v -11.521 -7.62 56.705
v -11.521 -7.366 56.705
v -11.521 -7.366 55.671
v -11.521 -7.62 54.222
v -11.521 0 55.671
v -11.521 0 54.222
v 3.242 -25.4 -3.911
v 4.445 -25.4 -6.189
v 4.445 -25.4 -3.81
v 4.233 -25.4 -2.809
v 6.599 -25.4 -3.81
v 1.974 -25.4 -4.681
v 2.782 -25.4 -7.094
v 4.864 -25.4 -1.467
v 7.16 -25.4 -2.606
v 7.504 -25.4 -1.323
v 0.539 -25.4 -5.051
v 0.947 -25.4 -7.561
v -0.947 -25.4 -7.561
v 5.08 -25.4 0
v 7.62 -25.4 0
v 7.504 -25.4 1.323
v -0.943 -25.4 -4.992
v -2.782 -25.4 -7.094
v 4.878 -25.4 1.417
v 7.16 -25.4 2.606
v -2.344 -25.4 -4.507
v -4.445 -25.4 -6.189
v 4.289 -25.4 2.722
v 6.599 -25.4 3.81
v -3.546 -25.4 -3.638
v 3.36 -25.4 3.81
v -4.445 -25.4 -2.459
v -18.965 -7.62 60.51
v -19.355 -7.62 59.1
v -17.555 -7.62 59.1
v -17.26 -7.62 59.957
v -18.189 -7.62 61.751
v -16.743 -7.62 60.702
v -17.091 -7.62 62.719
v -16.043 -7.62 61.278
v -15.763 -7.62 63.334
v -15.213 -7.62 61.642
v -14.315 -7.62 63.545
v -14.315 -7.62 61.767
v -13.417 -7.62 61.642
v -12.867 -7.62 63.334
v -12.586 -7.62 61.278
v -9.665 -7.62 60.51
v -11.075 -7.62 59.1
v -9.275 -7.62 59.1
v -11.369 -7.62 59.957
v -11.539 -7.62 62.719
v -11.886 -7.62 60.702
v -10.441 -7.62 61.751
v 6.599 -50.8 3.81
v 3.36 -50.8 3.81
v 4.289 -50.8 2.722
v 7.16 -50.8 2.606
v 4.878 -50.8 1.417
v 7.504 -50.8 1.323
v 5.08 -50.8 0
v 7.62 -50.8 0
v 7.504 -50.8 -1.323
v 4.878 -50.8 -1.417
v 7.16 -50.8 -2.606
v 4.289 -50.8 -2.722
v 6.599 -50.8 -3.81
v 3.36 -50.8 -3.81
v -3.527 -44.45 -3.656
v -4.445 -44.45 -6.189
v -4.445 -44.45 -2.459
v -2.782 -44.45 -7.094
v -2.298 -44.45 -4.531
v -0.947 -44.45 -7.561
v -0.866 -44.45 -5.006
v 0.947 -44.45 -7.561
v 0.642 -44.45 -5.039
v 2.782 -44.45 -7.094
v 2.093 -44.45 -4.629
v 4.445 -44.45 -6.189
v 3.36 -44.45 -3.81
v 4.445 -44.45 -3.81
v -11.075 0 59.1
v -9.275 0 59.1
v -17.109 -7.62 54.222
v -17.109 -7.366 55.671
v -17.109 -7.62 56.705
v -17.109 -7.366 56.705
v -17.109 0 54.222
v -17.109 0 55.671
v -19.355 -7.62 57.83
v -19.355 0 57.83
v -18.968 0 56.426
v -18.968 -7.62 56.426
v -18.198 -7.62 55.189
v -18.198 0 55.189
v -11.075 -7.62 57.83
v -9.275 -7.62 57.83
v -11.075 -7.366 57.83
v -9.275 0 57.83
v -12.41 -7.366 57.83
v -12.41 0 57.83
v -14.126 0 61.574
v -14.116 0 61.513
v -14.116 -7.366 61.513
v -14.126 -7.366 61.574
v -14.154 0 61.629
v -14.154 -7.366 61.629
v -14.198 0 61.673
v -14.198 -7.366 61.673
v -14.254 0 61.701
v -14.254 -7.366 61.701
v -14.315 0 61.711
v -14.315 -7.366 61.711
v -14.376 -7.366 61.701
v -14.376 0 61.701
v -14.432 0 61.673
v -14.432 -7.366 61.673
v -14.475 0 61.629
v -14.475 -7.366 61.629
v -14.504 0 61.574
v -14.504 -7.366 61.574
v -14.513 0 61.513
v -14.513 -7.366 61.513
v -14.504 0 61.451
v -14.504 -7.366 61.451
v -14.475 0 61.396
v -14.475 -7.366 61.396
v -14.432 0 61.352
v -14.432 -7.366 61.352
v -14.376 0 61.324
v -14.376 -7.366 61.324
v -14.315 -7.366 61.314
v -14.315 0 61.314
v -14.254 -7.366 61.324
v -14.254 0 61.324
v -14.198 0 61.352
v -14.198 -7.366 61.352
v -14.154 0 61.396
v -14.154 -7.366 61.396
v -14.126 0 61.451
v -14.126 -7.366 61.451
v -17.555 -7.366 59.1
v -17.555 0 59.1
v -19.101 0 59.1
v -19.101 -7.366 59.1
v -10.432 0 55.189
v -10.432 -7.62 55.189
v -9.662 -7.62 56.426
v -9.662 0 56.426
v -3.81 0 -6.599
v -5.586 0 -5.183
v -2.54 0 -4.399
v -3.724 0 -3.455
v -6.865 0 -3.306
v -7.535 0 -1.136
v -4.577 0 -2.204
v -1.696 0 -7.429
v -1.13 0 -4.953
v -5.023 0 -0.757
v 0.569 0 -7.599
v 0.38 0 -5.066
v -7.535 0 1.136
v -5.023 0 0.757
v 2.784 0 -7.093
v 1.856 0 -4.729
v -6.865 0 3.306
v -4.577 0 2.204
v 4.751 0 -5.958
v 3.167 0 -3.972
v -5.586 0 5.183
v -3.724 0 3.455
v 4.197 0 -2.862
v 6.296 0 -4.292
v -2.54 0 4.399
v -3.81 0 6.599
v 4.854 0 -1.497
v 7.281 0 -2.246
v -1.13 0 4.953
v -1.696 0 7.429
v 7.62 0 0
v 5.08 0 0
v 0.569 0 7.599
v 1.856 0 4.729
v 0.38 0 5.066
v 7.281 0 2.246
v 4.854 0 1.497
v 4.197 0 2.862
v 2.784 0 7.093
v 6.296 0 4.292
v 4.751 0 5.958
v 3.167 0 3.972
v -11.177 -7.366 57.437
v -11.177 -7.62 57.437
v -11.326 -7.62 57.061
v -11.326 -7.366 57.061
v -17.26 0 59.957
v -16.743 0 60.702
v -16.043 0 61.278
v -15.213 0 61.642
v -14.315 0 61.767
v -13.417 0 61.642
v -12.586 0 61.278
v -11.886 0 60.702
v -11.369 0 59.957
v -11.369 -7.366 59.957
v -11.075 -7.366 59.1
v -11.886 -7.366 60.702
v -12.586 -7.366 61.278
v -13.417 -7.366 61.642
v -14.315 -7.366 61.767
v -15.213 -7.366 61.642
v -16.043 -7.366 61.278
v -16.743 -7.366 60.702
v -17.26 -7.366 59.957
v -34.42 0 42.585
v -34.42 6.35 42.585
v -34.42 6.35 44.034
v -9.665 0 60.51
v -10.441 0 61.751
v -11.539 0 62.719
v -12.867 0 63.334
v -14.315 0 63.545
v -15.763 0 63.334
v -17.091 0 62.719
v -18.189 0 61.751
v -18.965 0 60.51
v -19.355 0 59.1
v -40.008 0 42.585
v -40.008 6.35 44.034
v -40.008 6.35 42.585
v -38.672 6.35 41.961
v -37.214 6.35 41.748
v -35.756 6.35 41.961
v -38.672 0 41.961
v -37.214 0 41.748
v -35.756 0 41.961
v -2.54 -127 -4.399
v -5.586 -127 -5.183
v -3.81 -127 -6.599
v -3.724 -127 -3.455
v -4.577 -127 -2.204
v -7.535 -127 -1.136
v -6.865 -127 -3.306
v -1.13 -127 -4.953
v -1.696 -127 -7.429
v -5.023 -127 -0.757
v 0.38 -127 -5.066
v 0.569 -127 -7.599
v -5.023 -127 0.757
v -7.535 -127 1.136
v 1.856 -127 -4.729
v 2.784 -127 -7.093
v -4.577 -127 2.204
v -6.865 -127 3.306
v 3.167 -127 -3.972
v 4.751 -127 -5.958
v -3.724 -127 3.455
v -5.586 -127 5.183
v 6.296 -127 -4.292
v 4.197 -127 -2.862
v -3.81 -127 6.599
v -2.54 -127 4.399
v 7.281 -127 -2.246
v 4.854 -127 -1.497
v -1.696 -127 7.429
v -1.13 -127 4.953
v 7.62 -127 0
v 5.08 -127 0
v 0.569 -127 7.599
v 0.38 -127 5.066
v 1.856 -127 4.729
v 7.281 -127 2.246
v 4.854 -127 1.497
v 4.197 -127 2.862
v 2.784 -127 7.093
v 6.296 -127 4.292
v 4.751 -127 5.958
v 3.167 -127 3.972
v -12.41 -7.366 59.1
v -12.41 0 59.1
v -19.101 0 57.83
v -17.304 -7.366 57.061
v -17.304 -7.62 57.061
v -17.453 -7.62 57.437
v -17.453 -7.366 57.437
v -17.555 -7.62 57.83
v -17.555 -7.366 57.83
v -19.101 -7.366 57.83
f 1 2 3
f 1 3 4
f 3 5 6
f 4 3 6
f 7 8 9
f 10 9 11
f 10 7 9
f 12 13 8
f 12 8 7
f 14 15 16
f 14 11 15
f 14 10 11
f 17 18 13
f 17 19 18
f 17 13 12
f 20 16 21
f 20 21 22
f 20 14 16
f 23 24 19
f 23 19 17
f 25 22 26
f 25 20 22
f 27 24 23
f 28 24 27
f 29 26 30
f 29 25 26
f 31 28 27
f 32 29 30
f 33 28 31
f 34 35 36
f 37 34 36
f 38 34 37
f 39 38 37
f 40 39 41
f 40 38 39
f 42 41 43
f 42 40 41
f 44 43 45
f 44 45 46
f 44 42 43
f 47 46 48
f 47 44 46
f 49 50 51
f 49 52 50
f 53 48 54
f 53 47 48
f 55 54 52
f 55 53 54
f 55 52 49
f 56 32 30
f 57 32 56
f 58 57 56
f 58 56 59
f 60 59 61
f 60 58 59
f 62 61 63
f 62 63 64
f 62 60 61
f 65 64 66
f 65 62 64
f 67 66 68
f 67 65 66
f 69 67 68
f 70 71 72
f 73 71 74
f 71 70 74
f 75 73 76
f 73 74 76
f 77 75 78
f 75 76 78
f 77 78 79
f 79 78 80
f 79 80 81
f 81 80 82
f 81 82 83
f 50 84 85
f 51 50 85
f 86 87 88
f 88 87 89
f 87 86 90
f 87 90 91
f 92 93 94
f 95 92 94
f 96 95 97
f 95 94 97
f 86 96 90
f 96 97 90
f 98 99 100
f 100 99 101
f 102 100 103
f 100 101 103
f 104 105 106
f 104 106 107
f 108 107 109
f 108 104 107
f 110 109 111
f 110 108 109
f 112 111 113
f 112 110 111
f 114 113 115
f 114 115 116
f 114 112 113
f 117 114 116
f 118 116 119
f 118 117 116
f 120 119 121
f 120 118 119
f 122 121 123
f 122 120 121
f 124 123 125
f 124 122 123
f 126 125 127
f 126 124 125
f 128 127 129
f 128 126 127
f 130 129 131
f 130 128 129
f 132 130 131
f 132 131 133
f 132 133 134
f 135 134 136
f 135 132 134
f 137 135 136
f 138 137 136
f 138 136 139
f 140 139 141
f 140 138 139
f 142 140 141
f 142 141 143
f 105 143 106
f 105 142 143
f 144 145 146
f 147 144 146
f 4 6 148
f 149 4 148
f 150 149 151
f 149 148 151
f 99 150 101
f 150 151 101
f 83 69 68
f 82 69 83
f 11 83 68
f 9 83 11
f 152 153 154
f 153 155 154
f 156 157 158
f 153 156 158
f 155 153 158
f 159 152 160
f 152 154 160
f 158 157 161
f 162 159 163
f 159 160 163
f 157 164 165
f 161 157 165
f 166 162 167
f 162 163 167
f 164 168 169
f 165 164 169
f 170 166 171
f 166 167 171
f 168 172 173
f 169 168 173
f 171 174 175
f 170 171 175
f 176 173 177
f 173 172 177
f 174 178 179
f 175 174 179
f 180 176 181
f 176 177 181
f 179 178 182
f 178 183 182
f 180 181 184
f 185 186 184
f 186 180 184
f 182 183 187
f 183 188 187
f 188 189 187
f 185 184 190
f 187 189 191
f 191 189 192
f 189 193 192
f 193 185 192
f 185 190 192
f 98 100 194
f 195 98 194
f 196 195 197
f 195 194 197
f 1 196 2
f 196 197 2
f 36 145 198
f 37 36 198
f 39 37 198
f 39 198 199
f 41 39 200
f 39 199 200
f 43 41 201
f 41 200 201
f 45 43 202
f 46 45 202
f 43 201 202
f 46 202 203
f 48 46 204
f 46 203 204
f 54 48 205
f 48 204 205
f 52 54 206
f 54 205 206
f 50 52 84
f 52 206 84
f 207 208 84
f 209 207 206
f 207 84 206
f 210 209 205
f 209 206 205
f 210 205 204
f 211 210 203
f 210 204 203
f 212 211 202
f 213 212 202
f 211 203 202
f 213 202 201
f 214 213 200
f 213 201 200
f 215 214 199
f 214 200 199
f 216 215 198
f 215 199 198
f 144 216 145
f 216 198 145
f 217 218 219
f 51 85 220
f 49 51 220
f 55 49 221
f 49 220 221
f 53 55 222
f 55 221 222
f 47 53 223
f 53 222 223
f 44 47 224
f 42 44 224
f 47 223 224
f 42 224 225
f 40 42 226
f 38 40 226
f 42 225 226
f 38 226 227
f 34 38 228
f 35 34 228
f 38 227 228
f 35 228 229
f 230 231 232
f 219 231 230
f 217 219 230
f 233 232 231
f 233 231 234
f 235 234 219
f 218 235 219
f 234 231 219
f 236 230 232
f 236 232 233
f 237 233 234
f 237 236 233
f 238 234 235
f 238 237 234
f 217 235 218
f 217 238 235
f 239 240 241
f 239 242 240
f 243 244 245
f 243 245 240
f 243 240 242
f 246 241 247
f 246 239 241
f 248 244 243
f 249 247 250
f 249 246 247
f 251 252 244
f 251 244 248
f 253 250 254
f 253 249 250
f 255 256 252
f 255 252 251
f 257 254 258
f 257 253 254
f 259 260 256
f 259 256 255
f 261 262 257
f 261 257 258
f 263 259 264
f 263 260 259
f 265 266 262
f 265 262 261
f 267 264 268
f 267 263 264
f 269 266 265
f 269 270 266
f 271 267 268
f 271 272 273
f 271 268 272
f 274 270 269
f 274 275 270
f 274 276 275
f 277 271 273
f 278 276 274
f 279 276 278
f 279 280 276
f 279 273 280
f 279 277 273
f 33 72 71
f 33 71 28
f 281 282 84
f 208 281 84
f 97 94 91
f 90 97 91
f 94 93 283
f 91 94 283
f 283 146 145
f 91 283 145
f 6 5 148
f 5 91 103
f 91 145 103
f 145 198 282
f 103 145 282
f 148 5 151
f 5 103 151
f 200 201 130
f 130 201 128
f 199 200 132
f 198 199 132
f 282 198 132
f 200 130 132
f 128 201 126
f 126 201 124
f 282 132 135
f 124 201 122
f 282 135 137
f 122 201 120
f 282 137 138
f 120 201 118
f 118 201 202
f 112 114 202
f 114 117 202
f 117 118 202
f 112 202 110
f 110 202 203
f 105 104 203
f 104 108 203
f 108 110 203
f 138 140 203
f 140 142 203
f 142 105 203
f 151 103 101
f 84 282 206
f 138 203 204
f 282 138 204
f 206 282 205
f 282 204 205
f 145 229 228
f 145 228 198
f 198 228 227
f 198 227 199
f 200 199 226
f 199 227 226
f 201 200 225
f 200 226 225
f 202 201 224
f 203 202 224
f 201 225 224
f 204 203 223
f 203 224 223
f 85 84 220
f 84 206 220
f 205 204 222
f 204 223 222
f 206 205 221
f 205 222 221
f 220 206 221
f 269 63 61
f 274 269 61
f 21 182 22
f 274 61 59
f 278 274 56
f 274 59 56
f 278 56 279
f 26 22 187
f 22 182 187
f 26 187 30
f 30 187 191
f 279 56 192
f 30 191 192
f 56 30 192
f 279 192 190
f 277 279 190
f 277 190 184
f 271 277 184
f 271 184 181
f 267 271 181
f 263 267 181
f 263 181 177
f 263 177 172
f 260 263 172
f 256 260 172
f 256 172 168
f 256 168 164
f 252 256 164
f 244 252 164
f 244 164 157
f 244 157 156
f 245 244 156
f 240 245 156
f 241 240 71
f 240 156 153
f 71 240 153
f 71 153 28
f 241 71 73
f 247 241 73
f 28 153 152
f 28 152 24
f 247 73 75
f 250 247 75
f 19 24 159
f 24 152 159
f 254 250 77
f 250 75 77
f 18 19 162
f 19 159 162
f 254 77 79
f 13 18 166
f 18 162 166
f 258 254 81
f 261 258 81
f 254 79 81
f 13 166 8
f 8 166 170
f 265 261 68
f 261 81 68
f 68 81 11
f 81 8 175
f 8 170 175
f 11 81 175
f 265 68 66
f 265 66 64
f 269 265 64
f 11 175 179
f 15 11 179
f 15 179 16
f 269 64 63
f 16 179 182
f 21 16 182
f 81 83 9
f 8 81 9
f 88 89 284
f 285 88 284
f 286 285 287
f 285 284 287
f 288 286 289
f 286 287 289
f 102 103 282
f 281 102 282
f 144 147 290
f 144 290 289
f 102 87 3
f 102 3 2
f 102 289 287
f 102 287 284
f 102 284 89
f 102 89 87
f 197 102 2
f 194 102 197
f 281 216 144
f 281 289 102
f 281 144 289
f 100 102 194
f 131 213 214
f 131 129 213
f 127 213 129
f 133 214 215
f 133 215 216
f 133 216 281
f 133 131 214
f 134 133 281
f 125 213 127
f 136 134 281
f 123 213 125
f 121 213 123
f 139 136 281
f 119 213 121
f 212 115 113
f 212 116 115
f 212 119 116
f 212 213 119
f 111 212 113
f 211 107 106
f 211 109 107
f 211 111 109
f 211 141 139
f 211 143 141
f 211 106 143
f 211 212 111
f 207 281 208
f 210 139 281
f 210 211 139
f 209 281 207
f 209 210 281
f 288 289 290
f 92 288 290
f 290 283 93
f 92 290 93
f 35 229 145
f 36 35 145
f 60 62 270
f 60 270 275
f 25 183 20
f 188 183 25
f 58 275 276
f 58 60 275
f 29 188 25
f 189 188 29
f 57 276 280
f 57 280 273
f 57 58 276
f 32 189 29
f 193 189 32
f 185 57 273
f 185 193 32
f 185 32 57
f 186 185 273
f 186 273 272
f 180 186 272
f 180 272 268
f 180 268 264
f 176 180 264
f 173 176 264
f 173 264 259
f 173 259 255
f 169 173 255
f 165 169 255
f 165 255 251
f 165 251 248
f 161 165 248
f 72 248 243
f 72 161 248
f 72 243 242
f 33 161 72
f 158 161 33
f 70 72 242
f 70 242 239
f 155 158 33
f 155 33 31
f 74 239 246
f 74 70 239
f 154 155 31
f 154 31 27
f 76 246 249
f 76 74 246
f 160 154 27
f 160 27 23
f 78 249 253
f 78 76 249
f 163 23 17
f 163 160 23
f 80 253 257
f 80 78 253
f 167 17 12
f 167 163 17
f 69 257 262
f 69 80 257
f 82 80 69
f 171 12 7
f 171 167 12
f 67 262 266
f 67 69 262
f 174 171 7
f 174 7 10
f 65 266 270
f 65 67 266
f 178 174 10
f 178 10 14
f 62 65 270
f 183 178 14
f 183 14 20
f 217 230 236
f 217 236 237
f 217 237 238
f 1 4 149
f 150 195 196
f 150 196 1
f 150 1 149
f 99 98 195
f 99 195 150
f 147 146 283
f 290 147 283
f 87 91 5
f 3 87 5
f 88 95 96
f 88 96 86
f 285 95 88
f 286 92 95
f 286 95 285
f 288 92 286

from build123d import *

# Parameters (mm, degrees)
F0_R      = 7.62
F0_R_2    = 5.08
F1_DEPTH  = 127
F2_W      = 8.89
F2_H      = 19.05
F3_DEPTH  = 25.4
F5_DEPTH  = 25.4
F6_DEPTH  = 6.35
F8_DEPTH  = 25.4
F9_DEPTH  = 7.62
F0_R_3    = 0.1984375
F10_DEPTH = 7.366


with BuildPart() as f1:
    # F0 (on Front) → F1 (new body)
    with BuildSketch(Plane.XZ):
        Circle(F0_R)
        Circle(F0_R_2, mode=Mode.SUBTRACT)
    extrude(amount=F1_DEPTH)

    # F2 (on Top) → F3 (cut)
    with BuildSketch(Plane.XY):
        with Locations((0, -34.925)):
            Rectangle(F2_W, F2_H)
    extrude(amount=-F3_DEPTH, mode=Mode.SUBTRACT)

    # F4 (on Right) → F5 (cut)
    with BuildSketch(Plane.YZ):
        Polygon((-25.4, -3.81), (-25.4, 0), (-25.4, 3.81), (-50.8, 3.81), (-50.8, 0), (-50.8, -3.81), align=None)
    extrude(amount=F5_DEPTH, mode=Mode.SUBTRACT)


with BuildPart() as f6:
    # F0 (on Front) → F6 (new body)
    with BuildSketch(Plane.XZ):
        with BuildLine():
            Line((-40.0079550745, 44.033558428), (-40.0079550745, 42.5849219836))
            ThreePointArc((-40.0079550745, 42.5849219836), (-37.2139550745, 41.747558428), (-34.4199550745, 42.5849219836))
            Line((-34.4199550745, 42.5849219836), (-34.4199550745, 44.033558428))
            Line((-34.4199550745, 44.033558428), (-37.2139550745, 44.033558428))
            Line((-37.2139550745, 44.033558428), (-40.0079550745, 44.033558428))
        make_face()
    extrude(amount=-F6_DEPTH)

    # F7 (on face) → F8 (cut)
    with BuildSketch(Plane(origin=(-40.0079550745, 0, 0), x_dir=(0, -1, 0), z_dir=(-1, 0, 0))):
        Polygon((0, 44.033558428), (-6.35, 44.033558428), (0, 42.5849219836), align=None)
    extrude(amount=-F8_DEPTH, mode=Mode.SUBTRACT)


with BuildPart() as f9:
    # F0 (on Front) → F9 (new body)
    with BuildSketch(Plane.XZ):
        with BuildLine():
            Line((-19.1010901349, 57.8297653733), (-19.3550901349, 57.8297653733))
            ThreePointArc((-19.3550901349, 57.8297653733), (-18.627388085, 55.7797814267), (-17.1089338874, 54.2221289288))
            Line((-17.1089338874, 54.2221289288), (-17.1089338874, 55.6707653733))
            Line((-17.1089338874, 55.6707653733), (-17.1089338874, 56.7050017528))
            ThreePointArc((-17.1089338874, 56.7050017528), (-17.3840819616, 57.2467612278), (-17.5553009962, 57.8297653733))
            Line((-17.5553009962, 57.8297653733), (-19.1010901349, 57.8297653733))
        make_face()
    extrude(amount=F9_DEPTH)



with BuildPart() as f9b:
    # F0 (on Front) → F9, piece 2 (new body)
    with BuildSketch(Plane.XZ):
        with BuildLine():
            ThreePointArc((-11.5209338874, 54.2221289288), (-10.0024796897, 55.7797814267), (-9.2747776398, 57.8297653733))
            Line((-9.2747776398, 57.8297653733), (-11.0745667785, 57.8297653733))
            ThreePointArc((-11.0745667785, 57.8297653733), (-11.2457858131, 57.2467612278), (-11.5209338874, 56.7050017528))
            Line((-11.5209338874, 56.7050017528), (-11.5209338874, 55.6707653733))
            Line((-11.5209338874, 55.6707653733), (-11.5209338874, 54.2221289288))
        make_face()
    extrude(amount=F9_DEPTH)


with BuildPart() as f9c:
    # F0 (on Front) → F9, piece 3 (new body)
    with BuildSketch(Plane.XZ):
        with BuildLine():
            Line((-11.0745667785, 59.0997653733), (-9.2747776398, 59.0997653733))
            ThreePointArc((-9.2747776398, 59.0997653733), (-14.3149338874, 63.5447653733), (-19.3550901349, 59.0997653733))
            Line((-19.3550901349, 59.0997653733), (-19.1010901349, 59.0997653733))
            Line((-19.1010901349, 59.0997653733), (-17.5553009962, 59.0997653733))
            ThreePointArc((-17.5553009962, 59.0997653733), (-14.3149338874, 61.7667653733), (-11.0745667785, 59.0997653733))
        make_face()
    extrude(amount=F9_DEPTH)


with BuildPart() as f9_1:
    add(f9.part)

    add(f9b.part)  # F10 merges F9b
    # F0 (on Front) + F9_face (on face) → F10 (join)
    with BuildSketch(Plane.XZ):
        with BuildLine():
            Line((-12.5551702669, 55.6707653733), (-11.5209338874, 55.6707653733))
            Line((-11.5209338874, 55.6707653733), (-11.5209338874, 56.7050017528))
            ThreePointArc((-11.5209338874, 56.7050017528), (-11.9800672959, 56.1298987818), (-12.5551702669, 55.6707653733))
        make_face()
        with BuildLine():
            Line((-17.1089338874, 56.7050017528), (-17.1089338874, 55.6707653733))
            Line((-17.1089338874, 55.6707653733), (-16.0746975079, 55.6707653733))
            ThreePointArc((-16.0746975079, 55.6707653733), (-16.6498004788, 56.1298987818), (-17.1089338874, 56.7050017528))
        make_face()
        with BuildLine():
            Line((-17.1089338874, 58.4647653733), (-17.1089338874, 57.8297653733))
            Line((-17.1089338874, 57.8297653733), (-17.0358181186, 57.8297653733))
            ThreePointArc((-17.0358181186, 57.8297653733), (-17.0905947584, 58.1451676122), (-17.1089338874, 58.4647653733))
        make_face()
        with BuildLine():
            ThreePointArc((-11.5209338874, 54.2221289288), (-10.0024796897, 55.7797814267), (-9.2747776398, 57.8297653733))
            Line((-9.2747776398, 57.8297653733), (-11.0745667785, 57.8297653733))
            ThreePointArc((-11.0745667785, 57.8297653733), (-11.2457858131, 57.2467612278), (-11.5209338874, 56.7050017528))
            Line((-11.5209338874, 56.7050017528), (-11.5209338874, 55.6707653733))
            Line((-11.5209338874, 55.6707653733), (-11.5209338874, 54.2221289288))
        make_face()
        with BuildLine():
            ThreePointArc((-12.5551702669, 55.6707653733), (-11.9800672959, 56.1298987818), (-11.5209338874, 56.7050017528))
            Line((-11.5209338874, 56.7050017528), (-11.5209338874, 57.8297653733))
            Line((-11.5209338874, 57.8297653733), (-11.5940496561, 57.8297653733))
            ThreePointArc((-11.5940496561, 57.8297653733), (-12.5782350073, 56.276087005), (-14.3149338874, 55.6707653733))
            Line((-14.3149338874, 55.6707653733), (-12.5551702669, 55.6707653733))
        make_face()
        with BuildLine():
            Line((-12.4099338874, 59.0997653733), (-11.5940496561, 59.0997653733))
            ThreePointArc((-11.5940496561, 59.0997653733), (-14.3149338874, 61.2587653733), (-17.0358181186, 59.0997653733))
            Line((-17.0358181186, 59.0997653733), (-16.2199338874, 59.0997653733))
            Line((-16.2199338874, 59.0997653733), (-16.2199338874, 58.4647653733))
            Line((-16.2199338874, 58.4647653733), (-16.2199338874, 57.8297653733))
            Line((-16.2199338874, 57.8297653733), (-17.0358181186, 57.8297653733))
            ThreePointArc((-17.0358181186, 57.8297653733), (-16.0516327674, 56.276087005), (-14.3149338874, 55.6707653733))
            ThreePointArc((-14.3149338874, 55.6707653733), (-12.5782350073, 56.276087005), (-11.5940496561, 57.8297653733))
            Line((-11.5940496561, 57.8297653733), (-12.4099338874, 57.8297653733))
            Line((-12.4099338874, 57.8297653733), (-12.4099338874, 58.4647653733))
            Line((-12.4099338874, 58.4647653733), (-12.4099338874, 59.0997653733))
        make_face()
        with BuildLine():
            ThreePointArc((-11.5209338874, 56.7050017528), (-11.2457858131, 57.2467612278), (-11.0745667785, 57.8297653733))
            Line((-11.0745667785, 57.8297653733), (-11.5209338874, 57.8297653733))
            Line((-11.5209338874, 57.8297653733), (-11.5209338874, 56.7050017528))
        make_face()
        with BuildLine():
            Line((-17.0358181186, 59.0997653733), (-17.5553009962, 59.0997653733))
            ThreePointArc((-17.5553009962, 59.0997653733), (-17.6169338874, 58.4647653733), (-17.5553009962, 57.8297653733))
            Line((-17.5553009962, 57.8297653733), (-17.1089338874, 57.8297653733))
            Line((-17.1089338874, 57.8297653733), (-17.1089338874, 58.4647653733))
            ThreePointArc((-17.1089338874, 58.4647653733), (-17.0905947584, 58.7843631344), (-17.0358181186, 59.0997653733))
        make_face()
        with BuildLine():
            Line((-16.2199338874, 59.0997653733), (-17.0358181186, 59.0997653733))
            ThreePointArc((-17.0358181186, 59.0997653733), (-17.0905947584, 58.7843631344), (-17.1089338874, 58.4647653733))
            ThreePointArc((-17.1089338874, 58.4647653733), (-17.0905947584, 58.1451676122), (-17.0358181186, 57.8297653733))
            Line((-17.0358181186, 57.8297653733), (-16.2199338874, 57.8297653733))
            Line((-16.2199338874, 57.8297653733), (-16.2199338874, 58.4647653733))
            Line((-16.2199338874, 58.4647653733), (-16.2199338874, 59.0997653733))
        make_face()
        with BuildLine():
            Line((-11.5940496561, 59.0997653733), (-11.0745667785, 59.0997653733))
            ThreePointArc((-11.0745667785, 59.0997653733), (-14.3149338874, 61.7667653733), (-17.5553009962, 59.0997653733))
            Line((-17.5553009962, 59.0997653733), (-17.0358181186, 59.0997653733))
            ThreePointArc((-17.0358181186, 59.0997653733), (-14.3149338874, 61.2587653733), (-11.5940496561, 59.0997653733))
        make_face()
        with Locations((-14.3149338874, 61.5127653733)):
            Circle(F0_R_3, mode=Mode.SUBTRACT)
        with BuildLine():
            Line((-17.1089338874, 57.8297653733), (-17.1089338874, 56.7050017528))
            ThreePointArc((-17.1089338874, 56.7050017528), (-16.6498004788, 56.1298987818), (-16.0746975079, 55.6707653733))
            Line((-16.0746975079, 55.6707653733), (-14.3149338874, 55.6707653733))
            ThreePointArc((-14.3149338874, 55.6707653733), (-16.0516327674, 56.276087005), (-17.0358181186, 57.8297653733))
            Line((-17.0358181186, 57.8297653733), (-17.1089338874, 57.8297653733))
        make_face()
        with BuildLine():
            Line((-17.1089338874, 57.8297653733), (-17.5553009962, 57.8297653733))
            ThreePointArc((-17.5553009962, 57.8297653733), (-17.3840819616, 57.2467612278), (-17.1089338874, 56.7050017528))
            Line((-17.1089338874, 56.7050017528), (-17.1089338874, 57.8297653733))
        make_face()
        with BuildLine():
            Line((-17.5553009962, 59.0997653733), (-19.1010901349, 59.0997653733))
            Line((-19.1010901349, 59.0997653733), (-19.1010901349, 57.8297653733))
            Line((-19.1010901349, 57.8297653733), (-17.5553009962, 57.8297653733))
            ThreePointArc((-17.5553009962, 57.8297653733), (-17.6169338874, 58.4647653733), (-17.5553009962, 59.0997653733))
        make_face()
    with BuildSketch(Plane(origin=(-18.0313352831, 0, 56.397449036), x_dir=(1, 0, 0), z_dir=(0, 1, 0))):
        with BuildLine():
            ThreePointArc((0.4760342869, -1.4323163373), (0.6472533215, -0.8493121918), (0.9224013958, -0.3075527168))
            Line((0.9224013958, -0.3075527168), (0.9224013958, 2.1753201072))
            ThreePointArc((0.9224013958, 2.1753201072), (-0.5960528019, 0.6176676093), (-1.3237548518, -1.4323163373))
            Line((-1.3237548518, -1.4323163373), (0.4760342869, -1.4323163373))
        make_face()
    extrude(amount=F10_DEPTH, dir=(0, -1, 0))


solid = Compound([f1.part, f6.part, f9c.part, f9_1.part])
